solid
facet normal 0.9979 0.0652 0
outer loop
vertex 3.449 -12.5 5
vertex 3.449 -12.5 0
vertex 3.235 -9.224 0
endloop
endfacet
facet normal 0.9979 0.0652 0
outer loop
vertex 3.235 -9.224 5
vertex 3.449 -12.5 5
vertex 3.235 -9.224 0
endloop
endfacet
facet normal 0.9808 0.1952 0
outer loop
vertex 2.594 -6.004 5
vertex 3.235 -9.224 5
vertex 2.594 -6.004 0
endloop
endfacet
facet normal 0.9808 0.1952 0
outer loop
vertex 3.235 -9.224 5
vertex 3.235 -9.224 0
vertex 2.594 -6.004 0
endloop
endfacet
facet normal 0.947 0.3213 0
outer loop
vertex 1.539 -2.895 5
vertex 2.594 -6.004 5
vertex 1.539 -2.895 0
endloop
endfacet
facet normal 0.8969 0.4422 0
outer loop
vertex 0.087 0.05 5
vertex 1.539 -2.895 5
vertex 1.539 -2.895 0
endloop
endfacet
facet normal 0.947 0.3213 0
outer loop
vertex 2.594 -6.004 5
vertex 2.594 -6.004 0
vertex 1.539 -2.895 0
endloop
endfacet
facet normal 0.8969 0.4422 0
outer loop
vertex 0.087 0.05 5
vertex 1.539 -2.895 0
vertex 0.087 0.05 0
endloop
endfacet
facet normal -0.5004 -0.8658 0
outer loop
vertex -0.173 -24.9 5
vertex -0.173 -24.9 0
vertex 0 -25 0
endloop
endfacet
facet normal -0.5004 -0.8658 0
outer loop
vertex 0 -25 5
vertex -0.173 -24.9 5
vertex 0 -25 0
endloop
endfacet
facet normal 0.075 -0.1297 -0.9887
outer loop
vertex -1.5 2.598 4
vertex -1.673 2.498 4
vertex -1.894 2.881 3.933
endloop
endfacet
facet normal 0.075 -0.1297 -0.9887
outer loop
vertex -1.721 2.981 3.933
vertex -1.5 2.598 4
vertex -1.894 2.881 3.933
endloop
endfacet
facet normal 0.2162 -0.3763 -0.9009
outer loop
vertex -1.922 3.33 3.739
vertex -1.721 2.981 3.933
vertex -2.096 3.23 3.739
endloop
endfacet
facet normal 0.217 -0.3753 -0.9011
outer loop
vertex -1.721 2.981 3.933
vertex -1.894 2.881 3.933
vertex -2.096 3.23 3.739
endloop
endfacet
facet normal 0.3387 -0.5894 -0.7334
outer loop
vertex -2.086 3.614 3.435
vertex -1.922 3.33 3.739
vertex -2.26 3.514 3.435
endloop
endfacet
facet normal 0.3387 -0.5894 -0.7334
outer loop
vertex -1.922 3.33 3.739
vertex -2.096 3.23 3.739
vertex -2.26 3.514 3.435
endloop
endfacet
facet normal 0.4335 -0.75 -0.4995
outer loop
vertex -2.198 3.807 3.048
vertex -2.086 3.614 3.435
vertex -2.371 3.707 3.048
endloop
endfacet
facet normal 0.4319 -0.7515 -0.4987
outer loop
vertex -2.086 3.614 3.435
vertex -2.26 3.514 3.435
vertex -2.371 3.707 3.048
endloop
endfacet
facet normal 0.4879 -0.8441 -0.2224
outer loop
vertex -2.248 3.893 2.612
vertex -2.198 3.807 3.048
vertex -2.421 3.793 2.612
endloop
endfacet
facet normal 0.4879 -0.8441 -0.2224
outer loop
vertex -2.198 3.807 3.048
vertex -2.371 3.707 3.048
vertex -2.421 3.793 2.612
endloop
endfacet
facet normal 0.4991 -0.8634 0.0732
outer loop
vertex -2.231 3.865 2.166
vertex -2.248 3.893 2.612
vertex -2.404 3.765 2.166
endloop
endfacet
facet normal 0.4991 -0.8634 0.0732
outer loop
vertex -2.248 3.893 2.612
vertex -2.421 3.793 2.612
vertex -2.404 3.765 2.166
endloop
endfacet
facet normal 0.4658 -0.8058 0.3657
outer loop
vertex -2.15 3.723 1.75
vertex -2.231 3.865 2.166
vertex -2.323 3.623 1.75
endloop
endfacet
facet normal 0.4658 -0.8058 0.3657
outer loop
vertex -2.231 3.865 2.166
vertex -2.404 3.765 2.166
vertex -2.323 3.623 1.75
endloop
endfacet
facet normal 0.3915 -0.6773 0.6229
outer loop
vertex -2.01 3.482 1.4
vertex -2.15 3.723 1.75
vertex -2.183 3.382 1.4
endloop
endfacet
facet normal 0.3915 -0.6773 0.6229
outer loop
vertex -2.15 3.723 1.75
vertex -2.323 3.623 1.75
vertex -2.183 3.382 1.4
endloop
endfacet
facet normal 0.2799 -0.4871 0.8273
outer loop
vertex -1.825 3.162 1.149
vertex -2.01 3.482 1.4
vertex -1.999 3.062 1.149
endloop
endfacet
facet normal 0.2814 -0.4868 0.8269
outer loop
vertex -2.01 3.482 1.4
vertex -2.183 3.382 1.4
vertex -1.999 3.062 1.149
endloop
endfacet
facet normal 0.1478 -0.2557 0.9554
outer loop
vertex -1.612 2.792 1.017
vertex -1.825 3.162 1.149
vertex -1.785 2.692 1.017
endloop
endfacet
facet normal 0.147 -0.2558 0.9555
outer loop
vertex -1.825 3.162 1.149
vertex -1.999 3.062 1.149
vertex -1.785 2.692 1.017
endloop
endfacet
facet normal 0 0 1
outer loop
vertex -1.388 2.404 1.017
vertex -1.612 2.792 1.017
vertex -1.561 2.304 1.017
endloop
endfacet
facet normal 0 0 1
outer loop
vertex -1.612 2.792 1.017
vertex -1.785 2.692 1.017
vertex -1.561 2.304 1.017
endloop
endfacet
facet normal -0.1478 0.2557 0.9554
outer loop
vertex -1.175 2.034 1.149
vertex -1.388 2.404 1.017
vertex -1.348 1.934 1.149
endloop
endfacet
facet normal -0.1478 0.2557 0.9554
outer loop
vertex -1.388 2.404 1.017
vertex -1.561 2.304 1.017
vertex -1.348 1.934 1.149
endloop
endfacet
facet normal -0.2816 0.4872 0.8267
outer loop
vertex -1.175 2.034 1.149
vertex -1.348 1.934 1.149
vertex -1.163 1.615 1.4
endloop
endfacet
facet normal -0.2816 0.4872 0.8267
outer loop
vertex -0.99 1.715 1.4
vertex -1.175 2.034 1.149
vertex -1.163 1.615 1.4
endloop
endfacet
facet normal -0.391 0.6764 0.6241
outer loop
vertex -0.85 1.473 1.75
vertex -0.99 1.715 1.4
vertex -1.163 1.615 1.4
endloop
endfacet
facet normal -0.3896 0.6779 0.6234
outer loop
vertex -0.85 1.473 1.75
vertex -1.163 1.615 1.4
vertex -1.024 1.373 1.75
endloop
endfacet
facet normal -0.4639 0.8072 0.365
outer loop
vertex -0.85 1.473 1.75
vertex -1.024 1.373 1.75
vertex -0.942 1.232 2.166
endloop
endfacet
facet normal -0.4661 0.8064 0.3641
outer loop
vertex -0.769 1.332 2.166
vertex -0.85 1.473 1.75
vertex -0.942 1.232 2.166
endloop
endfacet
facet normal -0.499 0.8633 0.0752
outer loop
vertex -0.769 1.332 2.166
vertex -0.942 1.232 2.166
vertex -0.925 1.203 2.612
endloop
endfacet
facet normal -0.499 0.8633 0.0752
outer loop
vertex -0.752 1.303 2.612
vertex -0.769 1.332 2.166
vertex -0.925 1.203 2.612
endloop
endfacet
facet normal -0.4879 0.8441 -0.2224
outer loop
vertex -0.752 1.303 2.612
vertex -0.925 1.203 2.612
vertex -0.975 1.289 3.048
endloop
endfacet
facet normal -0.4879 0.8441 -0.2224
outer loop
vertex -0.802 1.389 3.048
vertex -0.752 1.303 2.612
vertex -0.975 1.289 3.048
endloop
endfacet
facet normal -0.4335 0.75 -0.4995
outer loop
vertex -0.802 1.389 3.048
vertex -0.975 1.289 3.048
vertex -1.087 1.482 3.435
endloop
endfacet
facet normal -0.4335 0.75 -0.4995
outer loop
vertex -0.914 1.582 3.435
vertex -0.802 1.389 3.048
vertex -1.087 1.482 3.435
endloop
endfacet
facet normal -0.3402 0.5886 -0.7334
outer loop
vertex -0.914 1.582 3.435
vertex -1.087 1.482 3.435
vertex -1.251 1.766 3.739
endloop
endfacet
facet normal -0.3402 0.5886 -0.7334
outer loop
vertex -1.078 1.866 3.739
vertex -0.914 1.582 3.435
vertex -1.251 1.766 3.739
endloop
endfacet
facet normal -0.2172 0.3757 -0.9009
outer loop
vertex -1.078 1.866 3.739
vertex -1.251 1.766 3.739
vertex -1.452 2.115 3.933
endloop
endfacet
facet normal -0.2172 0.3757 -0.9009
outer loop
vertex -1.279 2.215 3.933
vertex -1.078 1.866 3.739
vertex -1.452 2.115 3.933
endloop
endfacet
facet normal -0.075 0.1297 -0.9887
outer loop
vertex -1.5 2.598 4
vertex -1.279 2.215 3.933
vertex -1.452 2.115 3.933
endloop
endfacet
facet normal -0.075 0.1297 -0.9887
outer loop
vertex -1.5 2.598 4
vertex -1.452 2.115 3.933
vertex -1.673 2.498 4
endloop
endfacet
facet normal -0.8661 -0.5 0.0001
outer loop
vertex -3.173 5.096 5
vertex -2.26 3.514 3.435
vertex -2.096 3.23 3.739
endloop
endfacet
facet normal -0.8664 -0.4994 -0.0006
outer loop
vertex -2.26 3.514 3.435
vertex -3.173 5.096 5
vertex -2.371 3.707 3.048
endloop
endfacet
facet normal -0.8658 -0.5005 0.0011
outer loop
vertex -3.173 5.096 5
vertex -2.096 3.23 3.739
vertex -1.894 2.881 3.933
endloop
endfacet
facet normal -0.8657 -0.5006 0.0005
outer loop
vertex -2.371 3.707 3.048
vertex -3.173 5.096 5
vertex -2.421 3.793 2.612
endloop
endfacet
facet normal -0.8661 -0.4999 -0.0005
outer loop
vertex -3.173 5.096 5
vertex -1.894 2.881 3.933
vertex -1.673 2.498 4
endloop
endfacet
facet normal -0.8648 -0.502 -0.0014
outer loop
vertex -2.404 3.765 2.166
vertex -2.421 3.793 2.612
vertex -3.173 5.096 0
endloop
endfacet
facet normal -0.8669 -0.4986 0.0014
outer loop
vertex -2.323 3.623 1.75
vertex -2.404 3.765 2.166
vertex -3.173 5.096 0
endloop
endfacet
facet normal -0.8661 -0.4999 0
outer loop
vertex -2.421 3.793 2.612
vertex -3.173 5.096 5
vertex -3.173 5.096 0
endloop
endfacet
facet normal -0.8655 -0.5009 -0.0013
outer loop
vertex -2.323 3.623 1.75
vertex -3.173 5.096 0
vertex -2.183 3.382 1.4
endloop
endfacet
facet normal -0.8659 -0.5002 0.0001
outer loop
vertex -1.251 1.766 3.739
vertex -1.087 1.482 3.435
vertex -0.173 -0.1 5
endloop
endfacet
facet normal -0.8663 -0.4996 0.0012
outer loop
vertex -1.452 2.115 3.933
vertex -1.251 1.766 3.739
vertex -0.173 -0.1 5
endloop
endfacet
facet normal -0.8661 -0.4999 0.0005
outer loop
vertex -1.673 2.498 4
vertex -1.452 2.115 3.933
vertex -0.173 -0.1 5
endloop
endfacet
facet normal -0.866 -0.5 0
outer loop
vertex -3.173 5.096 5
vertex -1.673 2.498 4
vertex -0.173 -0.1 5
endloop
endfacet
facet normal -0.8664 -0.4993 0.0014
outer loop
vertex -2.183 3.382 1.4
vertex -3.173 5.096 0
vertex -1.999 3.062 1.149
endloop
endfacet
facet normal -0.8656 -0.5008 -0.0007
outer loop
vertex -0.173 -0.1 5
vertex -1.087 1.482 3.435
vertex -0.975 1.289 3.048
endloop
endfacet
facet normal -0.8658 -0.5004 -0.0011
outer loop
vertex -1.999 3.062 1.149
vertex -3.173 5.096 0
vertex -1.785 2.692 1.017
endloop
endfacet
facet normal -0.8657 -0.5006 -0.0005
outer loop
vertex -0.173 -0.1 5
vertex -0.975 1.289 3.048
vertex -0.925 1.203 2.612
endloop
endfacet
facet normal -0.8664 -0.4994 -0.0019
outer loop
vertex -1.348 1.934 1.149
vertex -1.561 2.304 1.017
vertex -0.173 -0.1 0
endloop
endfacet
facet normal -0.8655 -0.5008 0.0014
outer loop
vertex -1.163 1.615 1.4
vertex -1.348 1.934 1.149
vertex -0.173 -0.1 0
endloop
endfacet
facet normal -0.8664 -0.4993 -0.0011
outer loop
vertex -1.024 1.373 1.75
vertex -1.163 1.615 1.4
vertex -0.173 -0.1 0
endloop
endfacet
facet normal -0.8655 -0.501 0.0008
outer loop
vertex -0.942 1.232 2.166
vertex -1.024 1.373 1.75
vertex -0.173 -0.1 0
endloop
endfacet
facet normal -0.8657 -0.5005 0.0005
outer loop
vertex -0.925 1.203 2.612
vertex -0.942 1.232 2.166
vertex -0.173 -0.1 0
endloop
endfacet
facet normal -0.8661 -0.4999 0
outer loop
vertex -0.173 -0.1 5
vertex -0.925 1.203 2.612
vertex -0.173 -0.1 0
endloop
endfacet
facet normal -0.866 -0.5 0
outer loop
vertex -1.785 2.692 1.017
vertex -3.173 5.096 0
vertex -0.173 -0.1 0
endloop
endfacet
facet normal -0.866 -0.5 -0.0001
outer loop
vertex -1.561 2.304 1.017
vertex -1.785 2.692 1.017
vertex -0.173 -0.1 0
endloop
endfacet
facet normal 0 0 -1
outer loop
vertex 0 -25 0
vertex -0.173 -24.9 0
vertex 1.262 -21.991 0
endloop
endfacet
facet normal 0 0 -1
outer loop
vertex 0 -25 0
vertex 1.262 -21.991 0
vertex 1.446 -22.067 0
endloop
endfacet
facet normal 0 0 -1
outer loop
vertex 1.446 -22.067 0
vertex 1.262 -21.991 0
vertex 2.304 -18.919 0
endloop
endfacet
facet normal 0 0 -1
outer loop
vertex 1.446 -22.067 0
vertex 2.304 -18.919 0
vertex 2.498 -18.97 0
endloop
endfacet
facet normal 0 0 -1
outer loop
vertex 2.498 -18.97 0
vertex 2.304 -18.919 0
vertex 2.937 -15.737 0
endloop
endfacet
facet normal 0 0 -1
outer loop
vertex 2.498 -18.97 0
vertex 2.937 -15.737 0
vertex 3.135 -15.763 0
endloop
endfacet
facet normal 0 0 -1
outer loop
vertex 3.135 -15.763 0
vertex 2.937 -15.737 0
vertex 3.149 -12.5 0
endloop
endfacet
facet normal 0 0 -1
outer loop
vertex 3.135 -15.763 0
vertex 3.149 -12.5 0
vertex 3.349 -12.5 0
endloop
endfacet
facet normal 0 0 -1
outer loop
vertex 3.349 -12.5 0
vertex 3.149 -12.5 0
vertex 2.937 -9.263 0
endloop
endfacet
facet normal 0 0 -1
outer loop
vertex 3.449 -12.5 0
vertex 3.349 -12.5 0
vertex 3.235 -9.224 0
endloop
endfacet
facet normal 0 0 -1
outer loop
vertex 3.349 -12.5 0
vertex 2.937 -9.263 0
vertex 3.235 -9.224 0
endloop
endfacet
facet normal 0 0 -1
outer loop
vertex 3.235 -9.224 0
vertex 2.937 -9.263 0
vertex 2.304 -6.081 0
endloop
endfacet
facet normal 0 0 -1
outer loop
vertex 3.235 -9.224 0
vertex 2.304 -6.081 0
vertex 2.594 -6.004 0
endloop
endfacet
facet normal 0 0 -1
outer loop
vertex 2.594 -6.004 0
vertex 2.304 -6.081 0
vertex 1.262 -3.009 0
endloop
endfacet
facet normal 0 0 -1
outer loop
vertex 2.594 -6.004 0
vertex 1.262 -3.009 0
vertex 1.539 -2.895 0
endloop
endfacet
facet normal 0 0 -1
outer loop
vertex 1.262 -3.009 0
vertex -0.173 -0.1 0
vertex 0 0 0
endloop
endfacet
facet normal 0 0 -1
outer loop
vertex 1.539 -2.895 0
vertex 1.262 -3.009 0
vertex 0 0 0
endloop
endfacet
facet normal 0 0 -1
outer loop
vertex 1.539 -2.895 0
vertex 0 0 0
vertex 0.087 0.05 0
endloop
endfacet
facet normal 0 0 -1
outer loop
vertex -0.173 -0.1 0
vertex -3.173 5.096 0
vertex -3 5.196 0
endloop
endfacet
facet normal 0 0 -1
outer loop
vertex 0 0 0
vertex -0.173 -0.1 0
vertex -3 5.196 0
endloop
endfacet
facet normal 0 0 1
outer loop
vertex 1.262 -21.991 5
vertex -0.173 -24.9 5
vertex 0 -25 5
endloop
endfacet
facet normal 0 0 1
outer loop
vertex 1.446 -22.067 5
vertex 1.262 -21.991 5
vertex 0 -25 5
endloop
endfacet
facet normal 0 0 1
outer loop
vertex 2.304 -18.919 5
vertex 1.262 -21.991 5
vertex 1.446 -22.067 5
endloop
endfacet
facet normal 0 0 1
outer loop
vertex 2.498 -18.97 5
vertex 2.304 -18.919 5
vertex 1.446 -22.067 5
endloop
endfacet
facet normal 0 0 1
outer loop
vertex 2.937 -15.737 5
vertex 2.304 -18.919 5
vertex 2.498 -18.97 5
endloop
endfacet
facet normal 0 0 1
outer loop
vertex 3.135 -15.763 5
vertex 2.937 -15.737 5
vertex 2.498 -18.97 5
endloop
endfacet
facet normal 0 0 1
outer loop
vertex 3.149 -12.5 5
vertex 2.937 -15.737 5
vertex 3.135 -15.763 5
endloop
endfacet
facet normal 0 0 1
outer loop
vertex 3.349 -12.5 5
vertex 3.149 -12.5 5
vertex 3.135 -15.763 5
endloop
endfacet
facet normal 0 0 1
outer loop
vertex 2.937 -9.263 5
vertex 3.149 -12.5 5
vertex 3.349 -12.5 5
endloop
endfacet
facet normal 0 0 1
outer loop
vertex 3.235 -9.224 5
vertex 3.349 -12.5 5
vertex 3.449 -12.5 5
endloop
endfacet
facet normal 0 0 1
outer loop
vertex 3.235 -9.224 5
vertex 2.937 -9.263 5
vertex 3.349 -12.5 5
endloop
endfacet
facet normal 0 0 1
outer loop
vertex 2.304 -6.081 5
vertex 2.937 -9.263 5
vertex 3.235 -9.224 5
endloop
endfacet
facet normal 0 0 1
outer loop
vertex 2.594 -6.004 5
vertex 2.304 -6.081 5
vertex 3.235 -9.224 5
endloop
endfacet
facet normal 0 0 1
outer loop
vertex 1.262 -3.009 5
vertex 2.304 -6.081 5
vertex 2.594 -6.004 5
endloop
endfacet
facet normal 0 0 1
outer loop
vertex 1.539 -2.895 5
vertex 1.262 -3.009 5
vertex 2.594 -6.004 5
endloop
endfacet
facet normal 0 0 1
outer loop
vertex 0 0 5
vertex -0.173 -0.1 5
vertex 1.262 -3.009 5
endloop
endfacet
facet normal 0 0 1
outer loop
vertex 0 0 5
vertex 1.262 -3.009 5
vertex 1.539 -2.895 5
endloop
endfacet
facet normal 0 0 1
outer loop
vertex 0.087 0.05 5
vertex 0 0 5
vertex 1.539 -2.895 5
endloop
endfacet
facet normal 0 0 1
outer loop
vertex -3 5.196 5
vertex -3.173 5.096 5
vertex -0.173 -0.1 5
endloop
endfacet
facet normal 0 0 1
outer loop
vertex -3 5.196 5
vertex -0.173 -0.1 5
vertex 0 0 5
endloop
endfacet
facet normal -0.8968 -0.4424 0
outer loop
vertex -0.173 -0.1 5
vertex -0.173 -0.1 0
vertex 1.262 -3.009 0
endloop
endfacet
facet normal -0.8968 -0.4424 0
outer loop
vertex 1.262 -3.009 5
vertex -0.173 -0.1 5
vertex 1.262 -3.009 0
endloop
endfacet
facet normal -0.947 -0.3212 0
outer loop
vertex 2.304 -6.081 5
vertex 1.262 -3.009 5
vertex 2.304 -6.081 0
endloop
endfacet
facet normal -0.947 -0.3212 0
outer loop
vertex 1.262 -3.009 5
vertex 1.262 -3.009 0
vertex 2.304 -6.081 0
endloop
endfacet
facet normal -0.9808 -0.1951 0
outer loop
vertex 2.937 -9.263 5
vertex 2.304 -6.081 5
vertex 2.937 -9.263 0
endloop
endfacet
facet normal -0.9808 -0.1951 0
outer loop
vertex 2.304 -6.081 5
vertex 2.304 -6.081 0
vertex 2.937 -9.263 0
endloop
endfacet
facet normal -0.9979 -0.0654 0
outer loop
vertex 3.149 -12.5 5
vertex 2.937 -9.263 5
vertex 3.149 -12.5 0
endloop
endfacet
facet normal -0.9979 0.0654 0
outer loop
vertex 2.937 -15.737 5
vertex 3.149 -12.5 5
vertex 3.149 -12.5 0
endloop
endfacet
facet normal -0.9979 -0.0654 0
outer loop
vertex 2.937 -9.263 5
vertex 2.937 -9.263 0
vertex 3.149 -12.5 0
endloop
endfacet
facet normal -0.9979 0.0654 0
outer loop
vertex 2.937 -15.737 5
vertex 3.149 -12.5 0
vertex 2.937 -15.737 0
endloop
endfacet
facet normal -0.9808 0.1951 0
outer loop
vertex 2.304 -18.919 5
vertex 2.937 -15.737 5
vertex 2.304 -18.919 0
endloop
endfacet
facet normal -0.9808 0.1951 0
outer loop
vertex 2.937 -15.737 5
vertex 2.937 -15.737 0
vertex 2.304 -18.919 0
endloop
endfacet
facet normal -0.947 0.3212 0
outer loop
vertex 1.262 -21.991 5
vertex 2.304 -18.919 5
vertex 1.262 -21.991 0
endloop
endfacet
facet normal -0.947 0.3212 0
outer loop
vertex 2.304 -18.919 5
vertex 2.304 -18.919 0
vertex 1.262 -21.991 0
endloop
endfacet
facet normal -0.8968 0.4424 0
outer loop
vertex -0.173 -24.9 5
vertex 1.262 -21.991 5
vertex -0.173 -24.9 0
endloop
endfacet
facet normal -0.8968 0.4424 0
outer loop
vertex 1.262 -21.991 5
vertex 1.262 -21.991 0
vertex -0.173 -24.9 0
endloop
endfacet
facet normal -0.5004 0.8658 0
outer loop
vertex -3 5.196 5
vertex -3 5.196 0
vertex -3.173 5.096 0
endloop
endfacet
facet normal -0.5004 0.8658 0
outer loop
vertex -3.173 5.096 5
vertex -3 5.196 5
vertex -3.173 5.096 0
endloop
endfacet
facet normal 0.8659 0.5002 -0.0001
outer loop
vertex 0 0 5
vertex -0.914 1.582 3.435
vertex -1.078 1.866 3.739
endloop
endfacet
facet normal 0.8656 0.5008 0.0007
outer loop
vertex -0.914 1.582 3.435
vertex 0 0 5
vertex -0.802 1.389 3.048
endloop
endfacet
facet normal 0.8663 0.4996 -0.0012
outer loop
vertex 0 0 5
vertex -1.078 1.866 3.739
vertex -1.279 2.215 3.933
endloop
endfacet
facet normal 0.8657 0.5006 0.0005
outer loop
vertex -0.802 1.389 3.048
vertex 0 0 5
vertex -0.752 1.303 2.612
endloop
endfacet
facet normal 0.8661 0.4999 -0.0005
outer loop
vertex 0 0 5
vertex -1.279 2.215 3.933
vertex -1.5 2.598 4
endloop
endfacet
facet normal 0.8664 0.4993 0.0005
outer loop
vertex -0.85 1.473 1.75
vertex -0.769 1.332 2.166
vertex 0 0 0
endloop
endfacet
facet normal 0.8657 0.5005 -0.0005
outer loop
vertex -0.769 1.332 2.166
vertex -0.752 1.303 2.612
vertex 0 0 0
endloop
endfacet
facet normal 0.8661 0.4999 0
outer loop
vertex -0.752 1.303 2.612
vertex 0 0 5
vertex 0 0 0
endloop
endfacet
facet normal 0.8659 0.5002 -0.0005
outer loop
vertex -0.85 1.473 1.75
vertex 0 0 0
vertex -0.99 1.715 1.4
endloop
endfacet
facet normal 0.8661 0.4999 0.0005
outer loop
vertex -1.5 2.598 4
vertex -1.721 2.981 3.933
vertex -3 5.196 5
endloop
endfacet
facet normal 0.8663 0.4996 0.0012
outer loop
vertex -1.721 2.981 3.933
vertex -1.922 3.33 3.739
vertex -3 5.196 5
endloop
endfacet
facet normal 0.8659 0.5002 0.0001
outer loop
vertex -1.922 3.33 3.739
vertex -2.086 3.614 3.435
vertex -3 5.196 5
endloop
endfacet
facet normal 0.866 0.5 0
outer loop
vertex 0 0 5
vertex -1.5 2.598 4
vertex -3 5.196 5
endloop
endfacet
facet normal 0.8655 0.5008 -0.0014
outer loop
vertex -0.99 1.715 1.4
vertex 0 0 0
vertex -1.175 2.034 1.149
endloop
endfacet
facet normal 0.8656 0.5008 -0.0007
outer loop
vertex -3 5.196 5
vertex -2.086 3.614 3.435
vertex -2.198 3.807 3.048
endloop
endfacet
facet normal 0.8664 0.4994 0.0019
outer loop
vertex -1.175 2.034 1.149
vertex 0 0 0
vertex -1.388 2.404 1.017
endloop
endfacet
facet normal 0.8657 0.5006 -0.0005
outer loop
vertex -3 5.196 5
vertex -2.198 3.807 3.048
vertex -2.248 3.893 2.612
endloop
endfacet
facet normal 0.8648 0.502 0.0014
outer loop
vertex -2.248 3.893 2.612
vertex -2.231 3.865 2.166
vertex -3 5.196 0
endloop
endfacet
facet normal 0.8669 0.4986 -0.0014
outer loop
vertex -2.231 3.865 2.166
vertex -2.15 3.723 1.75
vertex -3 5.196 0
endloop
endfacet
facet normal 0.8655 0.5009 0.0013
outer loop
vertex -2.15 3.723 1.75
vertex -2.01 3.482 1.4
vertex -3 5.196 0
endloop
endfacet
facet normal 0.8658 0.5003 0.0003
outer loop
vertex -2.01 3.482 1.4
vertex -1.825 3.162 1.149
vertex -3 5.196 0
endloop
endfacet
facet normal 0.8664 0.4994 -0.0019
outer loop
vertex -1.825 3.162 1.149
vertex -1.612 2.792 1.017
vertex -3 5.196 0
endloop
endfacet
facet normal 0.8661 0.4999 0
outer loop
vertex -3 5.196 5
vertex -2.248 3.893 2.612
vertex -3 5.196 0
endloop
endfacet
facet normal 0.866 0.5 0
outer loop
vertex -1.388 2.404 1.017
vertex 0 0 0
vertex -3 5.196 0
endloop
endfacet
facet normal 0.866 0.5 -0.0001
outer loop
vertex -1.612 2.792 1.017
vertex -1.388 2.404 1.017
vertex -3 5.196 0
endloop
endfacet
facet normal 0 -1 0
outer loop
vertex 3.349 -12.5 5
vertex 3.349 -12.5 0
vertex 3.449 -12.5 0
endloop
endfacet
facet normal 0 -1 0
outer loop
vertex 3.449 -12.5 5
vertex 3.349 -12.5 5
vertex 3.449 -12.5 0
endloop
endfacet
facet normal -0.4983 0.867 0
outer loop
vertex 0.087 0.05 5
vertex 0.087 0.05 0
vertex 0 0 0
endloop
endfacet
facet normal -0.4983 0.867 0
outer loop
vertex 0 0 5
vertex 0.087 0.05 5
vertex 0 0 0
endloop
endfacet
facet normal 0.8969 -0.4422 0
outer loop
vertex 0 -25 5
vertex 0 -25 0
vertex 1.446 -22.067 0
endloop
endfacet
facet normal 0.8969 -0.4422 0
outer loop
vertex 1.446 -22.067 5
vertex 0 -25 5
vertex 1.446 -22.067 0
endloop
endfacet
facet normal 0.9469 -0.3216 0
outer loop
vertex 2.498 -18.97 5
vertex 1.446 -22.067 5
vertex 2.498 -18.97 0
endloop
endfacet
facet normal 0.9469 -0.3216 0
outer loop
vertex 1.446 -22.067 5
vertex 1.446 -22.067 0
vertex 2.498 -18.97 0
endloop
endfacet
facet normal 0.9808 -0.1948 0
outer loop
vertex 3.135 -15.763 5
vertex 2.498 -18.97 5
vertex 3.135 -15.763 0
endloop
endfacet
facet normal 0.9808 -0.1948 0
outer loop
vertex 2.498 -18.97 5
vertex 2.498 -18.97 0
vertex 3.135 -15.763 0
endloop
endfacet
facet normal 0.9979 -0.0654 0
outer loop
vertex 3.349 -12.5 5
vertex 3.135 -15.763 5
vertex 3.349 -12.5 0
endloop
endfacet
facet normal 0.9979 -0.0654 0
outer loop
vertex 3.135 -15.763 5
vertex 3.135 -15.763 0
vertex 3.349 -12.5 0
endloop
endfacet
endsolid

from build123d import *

# Parameters (mm, degrees)
EXTRUDE_1_DEPTH     = 5
SKETCH_2_R          = 1.5
CUT_EXTRUDE_1_DEPTH = 6.698711306
EXTRUDE_2_DEPTH     = 5


with BuildPart() as part:
    # 草图1 → 拉伸-薄壁1 (new body)
    with BuildSketch(Plane.XY):
        with BuildLine():
            ThreePointArc((0, -25), (3.349364905, -12.5), (0, 0))
            Line((0, 0), (-3, 5.196152423))
            Line((-3, 5.196152423), (-3.173205081, 5.096152423))
            Line((-3.173205081, 5.096152423), (-0.173205081, -0.1))
            ThreePointArc((-0.173205081, -0.1), (3.149364905, -12.5), (-0.173205081, -24.9))
            Line((-0.173205081, -24.9), (0, -25))
        make_face()
    extrude(amount=EXTRUDE_1_DEPTH)

    # 草图2 → 切除-拉伸1 (cut, through all)
    with BuildSketch(Plane(origin=(-0.173205081, -0.1, 0), x_dir=(0, 0, 1), z_dir=(-0.866025404, -0.5, 0))):
        with Locations((2.5, 3)):
            Circle(SKETCH_2_R)
    extrude(amount=-CUT_EXTRUDE_1_DEPTH, mode=Mode.SUBTRACT)

    # 草图3 → 拉伸-薄壁2 (add)
    with BuildSketch(Plane.XY):
        with BuildLine():
            ThreePointArc((0, 0), (2.497510563, -6.029523872), (3.349364905, -12.5))
            Line((3.349364905, -12.5), (3.449364905, -12.5))
            ThreePointArc((3.449364905, -12.5), (2.594103145, -6.003641968), (0.08660254, 0.05))
            Line((0.08660254, 0.05), (0, 0))
        make_face()
    extrude(amount=EXTRUDE_2_DEPTH)


solid = part.part
